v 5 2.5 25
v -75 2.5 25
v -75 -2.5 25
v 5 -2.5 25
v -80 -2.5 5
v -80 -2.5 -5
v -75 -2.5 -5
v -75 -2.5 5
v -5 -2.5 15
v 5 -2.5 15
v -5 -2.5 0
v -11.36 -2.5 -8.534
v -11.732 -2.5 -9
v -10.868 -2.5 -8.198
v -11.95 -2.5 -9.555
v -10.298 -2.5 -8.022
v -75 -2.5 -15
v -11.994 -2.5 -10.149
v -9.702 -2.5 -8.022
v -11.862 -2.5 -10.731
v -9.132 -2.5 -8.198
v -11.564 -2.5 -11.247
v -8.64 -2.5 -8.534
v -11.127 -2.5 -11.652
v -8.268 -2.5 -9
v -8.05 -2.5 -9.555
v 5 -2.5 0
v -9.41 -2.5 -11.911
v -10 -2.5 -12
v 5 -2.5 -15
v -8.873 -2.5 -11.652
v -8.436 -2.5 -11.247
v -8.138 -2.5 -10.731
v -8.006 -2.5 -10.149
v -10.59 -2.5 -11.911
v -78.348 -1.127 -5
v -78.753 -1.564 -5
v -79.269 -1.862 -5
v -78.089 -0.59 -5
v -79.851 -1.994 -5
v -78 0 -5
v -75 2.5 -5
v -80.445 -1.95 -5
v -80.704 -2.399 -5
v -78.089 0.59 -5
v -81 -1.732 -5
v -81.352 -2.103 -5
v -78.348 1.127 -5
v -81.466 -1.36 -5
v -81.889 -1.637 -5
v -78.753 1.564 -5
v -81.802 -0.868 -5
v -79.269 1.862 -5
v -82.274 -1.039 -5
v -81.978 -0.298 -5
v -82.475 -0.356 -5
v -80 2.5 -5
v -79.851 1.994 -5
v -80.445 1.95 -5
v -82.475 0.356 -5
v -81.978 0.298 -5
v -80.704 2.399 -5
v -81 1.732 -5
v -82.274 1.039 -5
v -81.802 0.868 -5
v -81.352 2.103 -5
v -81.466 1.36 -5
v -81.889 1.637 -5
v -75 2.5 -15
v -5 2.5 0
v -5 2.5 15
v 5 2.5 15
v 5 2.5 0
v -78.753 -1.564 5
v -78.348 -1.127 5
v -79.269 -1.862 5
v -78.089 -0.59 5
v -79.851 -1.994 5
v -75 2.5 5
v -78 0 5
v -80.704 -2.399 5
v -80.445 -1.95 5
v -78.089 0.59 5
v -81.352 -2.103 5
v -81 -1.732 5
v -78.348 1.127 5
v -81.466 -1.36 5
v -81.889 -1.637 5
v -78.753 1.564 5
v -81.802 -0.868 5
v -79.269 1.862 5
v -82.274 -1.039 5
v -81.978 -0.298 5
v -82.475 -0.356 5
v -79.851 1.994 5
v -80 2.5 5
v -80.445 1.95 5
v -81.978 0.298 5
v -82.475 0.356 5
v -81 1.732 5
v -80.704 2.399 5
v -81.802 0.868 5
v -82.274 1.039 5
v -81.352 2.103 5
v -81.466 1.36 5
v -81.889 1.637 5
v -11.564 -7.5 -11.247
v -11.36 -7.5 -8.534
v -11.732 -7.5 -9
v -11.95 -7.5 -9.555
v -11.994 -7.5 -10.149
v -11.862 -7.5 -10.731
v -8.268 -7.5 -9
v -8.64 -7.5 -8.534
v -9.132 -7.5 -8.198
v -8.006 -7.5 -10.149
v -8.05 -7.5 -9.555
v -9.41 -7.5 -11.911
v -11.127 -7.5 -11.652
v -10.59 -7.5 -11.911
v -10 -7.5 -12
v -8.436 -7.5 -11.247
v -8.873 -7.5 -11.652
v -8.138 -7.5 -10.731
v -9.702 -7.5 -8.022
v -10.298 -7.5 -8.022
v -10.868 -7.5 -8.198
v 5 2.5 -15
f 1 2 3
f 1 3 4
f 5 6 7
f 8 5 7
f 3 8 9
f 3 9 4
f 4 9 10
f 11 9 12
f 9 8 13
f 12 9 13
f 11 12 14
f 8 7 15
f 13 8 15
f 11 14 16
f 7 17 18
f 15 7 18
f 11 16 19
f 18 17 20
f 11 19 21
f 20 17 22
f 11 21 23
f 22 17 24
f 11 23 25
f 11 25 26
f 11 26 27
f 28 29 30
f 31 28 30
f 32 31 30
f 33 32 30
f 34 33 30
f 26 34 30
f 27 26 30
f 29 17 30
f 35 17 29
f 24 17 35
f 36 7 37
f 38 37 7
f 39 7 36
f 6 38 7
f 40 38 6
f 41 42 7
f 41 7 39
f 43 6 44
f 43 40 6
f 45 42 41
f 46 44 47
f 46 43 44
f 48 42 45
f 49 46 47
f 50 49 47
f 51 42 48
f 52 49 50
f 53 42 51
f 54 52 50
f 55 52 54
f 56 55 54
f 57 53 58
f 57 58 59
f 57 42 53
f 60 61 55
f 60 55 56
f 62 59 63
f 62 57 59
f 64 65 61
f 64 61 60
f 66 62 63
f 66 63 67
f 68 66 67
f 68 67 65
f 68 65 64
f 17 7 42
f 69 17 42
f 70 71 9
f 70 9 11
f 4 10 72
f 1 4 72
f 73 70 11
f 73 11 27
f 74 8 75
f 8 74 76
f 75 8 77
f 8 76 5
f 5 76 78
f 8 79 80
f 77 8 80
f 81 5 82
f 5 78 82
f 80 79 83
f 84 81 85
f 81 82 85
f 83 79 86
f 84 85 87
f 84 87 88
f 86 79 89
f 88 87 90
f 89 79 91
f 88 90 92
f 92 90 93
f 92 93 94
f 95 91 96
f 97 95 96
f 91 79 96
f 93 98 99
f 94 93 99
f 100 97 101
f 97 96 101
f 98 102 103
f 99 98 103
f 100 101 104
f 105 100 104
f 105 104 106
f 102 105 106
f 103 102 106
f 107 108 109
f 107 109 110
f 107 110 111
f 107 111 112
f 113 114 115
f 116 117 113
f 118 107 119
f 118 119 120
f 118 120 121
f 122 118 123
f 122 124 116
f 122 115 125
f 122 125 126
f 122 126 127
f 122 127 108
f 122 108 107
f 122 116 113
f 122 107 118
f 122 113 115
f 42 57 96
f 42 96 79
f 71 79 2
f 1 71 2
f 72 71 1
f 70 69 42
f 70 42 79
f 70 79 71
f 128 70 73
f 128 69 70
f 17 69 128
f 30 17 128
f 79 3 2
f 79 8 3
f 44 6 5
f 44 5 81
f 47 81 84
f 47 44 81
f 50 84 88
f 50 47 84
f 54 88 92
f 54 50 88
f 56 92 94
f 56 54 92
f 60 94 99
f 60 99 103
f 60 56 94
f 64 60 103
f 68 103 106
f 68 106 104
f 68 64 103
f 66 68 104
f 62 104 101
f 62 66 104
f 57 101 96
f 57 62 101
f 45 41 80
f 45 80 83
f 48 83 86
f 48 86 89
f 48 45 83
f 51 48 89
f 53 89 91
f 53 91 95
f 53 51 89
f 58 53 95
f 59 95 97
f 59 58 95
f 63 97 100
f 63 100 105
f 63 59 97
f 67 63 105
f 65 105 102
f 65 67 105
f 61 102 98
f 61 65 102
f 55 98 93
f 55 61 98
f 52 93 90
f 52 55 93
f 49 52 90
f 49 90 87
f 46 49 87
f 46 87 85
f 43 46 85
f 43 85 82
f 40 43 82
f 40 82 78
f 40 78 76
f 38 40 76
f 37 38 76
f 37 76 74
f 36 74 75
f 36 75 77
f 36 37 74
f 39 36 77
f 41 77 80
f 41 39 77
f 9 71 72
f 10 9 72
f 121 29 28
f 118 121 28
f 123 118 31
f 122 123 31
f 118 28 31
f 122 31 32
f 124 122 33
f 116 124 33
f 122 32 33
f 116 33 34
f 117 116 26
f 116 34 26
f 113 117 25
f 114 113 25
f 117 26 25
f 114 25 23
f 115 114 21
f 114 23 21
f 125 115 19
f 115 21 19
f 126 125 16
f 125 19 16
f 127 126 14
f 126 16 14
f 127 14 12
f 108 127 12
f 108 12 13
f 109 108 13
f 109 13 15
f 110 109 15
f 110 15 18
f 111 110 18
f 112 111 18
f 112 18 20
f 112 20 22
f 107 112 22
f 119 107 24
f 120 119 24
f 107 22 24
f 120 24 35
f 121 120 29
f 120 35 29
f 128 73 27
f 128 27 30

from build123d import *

# Parameters (mm, degrees)
BASE_DEPTH         = 5
BASE_DEPTH_BACK    = 5
ESQUISSE1_R        = 2
ESQUISSE2_W        = 75
ESQUISSE2_H        = 5
BOSS_GRAND_DEPTH   = 10
ESQUISSE3_W        = 75
ESQUISSE3_H        = 5
BOSS_PETIT_DEPTH   = 10
ESQUISSE4_W        = 5
ESQUISSE4_H        = 15
BLOQUER_DEPTH      = 5
ESQUISSE5_W        = 5
ESQUISSE5_H        = 15
VIDE_BLOQUER_DEPTH = 5
ESQUISSE6_W        = 80
ESQUISSE6_H        = 5
BOSSE_BAS_DEPTH    = 10
ESQUISSE7_R        = 2
BOSS_EXTRU_6_DEPTH = 5


with BuildPart() as part:
    # Esquisse1 → BASE (new, two sides: drawn at the far end of the back side and taken through both)
    with BuildSketch(Plane.XY.offset(-BASE_DEPTH_BACK)):
        with BuildLine():
            Line((-80, 2.5), (0, 2.5))
            Line((0, 2.5), (0, -2.5))
            Line((0, -2.5), (-80, -2.5))
            ThreePointArc((-80, -2.5), (-82.5, 0), (-80, 2.5))
        make_face()
        with Locations((-80, 0)):
            Circle(ESQUISSE1_R, mode=Mode.SUBTRACT)
    extrude(amount=BASE_DEPTH + BASE_DEPTH_BACK)

    # Esquisse2 → BOSS GRAND (add)
    with BuildSketch(Plane.XY.offset(5)):
        with Locations((-37.5, 0)):
            Rectangle(ESQUISSE2_W, ESQUISSE2_H)
    extrude(amount=BOSS_GRAND_DEPTH)

    # Esquisse3 → BOSS PETIT (add)
    with BuildSketch(Plane(origin=(0, 0, -5), x_dir=(-1, 0, 0), z_dir=(0, 0, -1))):
        with Locations((37.5, 0)):
            Rectangle(ESQUISSE3_W, ESQUISSE3_H)
    extrude(amount=BOSS_PETIT_DEPTH)

    # Esquisse4 → BLOQUER (add)
    with BuildSketch(Plane(origin=(0, 2.5, 0), x_dir=(1, 0, 0), z_dir=(0, 1, 0))):
        with Locations((2.5, 7.5)):
            Rectangle(ESQUISSE4_W, ESQUISSE4_H)
    extrude(amount=-BLOQUER_DEPTH)

    # Esquisse5 → VIDE BLOQUER (cut)
    with BuildSketch(Plane(origin=(0, 2.5, 0), x_dir=(1, 0, 0), z_dir=(0, 1, 0))):
        with Locations((-2.5, -7.5)):
            Rectangle(ESQUISSE5_W, ESQUISSE5_H)
    extrude(amount=-VIDE_BLOQUER_DEPTH, mode=Mode.SUBTRACT)

    # Esquisse6 → BOSSE BAS (add)
    with BuildSketch(Plane.XY.offset(15)):
        with Locations((-35, 0)):
            Rectangle(ESQUISSE6_W, ESQUISSE6_H)
    extrude(amount=BOSSE_BAS_DEPTH)

    # Esquisse7 → Boss.-Extru.6 (add)
    with BuildSketch(Plane.XZ.offset(2.5)):
        with Locations((-10, -10)):
            Circle(ESQUISSE7_R)
    extrude(amount=BOSS_EXTRU_6_DEPTH)


solid = part.part
